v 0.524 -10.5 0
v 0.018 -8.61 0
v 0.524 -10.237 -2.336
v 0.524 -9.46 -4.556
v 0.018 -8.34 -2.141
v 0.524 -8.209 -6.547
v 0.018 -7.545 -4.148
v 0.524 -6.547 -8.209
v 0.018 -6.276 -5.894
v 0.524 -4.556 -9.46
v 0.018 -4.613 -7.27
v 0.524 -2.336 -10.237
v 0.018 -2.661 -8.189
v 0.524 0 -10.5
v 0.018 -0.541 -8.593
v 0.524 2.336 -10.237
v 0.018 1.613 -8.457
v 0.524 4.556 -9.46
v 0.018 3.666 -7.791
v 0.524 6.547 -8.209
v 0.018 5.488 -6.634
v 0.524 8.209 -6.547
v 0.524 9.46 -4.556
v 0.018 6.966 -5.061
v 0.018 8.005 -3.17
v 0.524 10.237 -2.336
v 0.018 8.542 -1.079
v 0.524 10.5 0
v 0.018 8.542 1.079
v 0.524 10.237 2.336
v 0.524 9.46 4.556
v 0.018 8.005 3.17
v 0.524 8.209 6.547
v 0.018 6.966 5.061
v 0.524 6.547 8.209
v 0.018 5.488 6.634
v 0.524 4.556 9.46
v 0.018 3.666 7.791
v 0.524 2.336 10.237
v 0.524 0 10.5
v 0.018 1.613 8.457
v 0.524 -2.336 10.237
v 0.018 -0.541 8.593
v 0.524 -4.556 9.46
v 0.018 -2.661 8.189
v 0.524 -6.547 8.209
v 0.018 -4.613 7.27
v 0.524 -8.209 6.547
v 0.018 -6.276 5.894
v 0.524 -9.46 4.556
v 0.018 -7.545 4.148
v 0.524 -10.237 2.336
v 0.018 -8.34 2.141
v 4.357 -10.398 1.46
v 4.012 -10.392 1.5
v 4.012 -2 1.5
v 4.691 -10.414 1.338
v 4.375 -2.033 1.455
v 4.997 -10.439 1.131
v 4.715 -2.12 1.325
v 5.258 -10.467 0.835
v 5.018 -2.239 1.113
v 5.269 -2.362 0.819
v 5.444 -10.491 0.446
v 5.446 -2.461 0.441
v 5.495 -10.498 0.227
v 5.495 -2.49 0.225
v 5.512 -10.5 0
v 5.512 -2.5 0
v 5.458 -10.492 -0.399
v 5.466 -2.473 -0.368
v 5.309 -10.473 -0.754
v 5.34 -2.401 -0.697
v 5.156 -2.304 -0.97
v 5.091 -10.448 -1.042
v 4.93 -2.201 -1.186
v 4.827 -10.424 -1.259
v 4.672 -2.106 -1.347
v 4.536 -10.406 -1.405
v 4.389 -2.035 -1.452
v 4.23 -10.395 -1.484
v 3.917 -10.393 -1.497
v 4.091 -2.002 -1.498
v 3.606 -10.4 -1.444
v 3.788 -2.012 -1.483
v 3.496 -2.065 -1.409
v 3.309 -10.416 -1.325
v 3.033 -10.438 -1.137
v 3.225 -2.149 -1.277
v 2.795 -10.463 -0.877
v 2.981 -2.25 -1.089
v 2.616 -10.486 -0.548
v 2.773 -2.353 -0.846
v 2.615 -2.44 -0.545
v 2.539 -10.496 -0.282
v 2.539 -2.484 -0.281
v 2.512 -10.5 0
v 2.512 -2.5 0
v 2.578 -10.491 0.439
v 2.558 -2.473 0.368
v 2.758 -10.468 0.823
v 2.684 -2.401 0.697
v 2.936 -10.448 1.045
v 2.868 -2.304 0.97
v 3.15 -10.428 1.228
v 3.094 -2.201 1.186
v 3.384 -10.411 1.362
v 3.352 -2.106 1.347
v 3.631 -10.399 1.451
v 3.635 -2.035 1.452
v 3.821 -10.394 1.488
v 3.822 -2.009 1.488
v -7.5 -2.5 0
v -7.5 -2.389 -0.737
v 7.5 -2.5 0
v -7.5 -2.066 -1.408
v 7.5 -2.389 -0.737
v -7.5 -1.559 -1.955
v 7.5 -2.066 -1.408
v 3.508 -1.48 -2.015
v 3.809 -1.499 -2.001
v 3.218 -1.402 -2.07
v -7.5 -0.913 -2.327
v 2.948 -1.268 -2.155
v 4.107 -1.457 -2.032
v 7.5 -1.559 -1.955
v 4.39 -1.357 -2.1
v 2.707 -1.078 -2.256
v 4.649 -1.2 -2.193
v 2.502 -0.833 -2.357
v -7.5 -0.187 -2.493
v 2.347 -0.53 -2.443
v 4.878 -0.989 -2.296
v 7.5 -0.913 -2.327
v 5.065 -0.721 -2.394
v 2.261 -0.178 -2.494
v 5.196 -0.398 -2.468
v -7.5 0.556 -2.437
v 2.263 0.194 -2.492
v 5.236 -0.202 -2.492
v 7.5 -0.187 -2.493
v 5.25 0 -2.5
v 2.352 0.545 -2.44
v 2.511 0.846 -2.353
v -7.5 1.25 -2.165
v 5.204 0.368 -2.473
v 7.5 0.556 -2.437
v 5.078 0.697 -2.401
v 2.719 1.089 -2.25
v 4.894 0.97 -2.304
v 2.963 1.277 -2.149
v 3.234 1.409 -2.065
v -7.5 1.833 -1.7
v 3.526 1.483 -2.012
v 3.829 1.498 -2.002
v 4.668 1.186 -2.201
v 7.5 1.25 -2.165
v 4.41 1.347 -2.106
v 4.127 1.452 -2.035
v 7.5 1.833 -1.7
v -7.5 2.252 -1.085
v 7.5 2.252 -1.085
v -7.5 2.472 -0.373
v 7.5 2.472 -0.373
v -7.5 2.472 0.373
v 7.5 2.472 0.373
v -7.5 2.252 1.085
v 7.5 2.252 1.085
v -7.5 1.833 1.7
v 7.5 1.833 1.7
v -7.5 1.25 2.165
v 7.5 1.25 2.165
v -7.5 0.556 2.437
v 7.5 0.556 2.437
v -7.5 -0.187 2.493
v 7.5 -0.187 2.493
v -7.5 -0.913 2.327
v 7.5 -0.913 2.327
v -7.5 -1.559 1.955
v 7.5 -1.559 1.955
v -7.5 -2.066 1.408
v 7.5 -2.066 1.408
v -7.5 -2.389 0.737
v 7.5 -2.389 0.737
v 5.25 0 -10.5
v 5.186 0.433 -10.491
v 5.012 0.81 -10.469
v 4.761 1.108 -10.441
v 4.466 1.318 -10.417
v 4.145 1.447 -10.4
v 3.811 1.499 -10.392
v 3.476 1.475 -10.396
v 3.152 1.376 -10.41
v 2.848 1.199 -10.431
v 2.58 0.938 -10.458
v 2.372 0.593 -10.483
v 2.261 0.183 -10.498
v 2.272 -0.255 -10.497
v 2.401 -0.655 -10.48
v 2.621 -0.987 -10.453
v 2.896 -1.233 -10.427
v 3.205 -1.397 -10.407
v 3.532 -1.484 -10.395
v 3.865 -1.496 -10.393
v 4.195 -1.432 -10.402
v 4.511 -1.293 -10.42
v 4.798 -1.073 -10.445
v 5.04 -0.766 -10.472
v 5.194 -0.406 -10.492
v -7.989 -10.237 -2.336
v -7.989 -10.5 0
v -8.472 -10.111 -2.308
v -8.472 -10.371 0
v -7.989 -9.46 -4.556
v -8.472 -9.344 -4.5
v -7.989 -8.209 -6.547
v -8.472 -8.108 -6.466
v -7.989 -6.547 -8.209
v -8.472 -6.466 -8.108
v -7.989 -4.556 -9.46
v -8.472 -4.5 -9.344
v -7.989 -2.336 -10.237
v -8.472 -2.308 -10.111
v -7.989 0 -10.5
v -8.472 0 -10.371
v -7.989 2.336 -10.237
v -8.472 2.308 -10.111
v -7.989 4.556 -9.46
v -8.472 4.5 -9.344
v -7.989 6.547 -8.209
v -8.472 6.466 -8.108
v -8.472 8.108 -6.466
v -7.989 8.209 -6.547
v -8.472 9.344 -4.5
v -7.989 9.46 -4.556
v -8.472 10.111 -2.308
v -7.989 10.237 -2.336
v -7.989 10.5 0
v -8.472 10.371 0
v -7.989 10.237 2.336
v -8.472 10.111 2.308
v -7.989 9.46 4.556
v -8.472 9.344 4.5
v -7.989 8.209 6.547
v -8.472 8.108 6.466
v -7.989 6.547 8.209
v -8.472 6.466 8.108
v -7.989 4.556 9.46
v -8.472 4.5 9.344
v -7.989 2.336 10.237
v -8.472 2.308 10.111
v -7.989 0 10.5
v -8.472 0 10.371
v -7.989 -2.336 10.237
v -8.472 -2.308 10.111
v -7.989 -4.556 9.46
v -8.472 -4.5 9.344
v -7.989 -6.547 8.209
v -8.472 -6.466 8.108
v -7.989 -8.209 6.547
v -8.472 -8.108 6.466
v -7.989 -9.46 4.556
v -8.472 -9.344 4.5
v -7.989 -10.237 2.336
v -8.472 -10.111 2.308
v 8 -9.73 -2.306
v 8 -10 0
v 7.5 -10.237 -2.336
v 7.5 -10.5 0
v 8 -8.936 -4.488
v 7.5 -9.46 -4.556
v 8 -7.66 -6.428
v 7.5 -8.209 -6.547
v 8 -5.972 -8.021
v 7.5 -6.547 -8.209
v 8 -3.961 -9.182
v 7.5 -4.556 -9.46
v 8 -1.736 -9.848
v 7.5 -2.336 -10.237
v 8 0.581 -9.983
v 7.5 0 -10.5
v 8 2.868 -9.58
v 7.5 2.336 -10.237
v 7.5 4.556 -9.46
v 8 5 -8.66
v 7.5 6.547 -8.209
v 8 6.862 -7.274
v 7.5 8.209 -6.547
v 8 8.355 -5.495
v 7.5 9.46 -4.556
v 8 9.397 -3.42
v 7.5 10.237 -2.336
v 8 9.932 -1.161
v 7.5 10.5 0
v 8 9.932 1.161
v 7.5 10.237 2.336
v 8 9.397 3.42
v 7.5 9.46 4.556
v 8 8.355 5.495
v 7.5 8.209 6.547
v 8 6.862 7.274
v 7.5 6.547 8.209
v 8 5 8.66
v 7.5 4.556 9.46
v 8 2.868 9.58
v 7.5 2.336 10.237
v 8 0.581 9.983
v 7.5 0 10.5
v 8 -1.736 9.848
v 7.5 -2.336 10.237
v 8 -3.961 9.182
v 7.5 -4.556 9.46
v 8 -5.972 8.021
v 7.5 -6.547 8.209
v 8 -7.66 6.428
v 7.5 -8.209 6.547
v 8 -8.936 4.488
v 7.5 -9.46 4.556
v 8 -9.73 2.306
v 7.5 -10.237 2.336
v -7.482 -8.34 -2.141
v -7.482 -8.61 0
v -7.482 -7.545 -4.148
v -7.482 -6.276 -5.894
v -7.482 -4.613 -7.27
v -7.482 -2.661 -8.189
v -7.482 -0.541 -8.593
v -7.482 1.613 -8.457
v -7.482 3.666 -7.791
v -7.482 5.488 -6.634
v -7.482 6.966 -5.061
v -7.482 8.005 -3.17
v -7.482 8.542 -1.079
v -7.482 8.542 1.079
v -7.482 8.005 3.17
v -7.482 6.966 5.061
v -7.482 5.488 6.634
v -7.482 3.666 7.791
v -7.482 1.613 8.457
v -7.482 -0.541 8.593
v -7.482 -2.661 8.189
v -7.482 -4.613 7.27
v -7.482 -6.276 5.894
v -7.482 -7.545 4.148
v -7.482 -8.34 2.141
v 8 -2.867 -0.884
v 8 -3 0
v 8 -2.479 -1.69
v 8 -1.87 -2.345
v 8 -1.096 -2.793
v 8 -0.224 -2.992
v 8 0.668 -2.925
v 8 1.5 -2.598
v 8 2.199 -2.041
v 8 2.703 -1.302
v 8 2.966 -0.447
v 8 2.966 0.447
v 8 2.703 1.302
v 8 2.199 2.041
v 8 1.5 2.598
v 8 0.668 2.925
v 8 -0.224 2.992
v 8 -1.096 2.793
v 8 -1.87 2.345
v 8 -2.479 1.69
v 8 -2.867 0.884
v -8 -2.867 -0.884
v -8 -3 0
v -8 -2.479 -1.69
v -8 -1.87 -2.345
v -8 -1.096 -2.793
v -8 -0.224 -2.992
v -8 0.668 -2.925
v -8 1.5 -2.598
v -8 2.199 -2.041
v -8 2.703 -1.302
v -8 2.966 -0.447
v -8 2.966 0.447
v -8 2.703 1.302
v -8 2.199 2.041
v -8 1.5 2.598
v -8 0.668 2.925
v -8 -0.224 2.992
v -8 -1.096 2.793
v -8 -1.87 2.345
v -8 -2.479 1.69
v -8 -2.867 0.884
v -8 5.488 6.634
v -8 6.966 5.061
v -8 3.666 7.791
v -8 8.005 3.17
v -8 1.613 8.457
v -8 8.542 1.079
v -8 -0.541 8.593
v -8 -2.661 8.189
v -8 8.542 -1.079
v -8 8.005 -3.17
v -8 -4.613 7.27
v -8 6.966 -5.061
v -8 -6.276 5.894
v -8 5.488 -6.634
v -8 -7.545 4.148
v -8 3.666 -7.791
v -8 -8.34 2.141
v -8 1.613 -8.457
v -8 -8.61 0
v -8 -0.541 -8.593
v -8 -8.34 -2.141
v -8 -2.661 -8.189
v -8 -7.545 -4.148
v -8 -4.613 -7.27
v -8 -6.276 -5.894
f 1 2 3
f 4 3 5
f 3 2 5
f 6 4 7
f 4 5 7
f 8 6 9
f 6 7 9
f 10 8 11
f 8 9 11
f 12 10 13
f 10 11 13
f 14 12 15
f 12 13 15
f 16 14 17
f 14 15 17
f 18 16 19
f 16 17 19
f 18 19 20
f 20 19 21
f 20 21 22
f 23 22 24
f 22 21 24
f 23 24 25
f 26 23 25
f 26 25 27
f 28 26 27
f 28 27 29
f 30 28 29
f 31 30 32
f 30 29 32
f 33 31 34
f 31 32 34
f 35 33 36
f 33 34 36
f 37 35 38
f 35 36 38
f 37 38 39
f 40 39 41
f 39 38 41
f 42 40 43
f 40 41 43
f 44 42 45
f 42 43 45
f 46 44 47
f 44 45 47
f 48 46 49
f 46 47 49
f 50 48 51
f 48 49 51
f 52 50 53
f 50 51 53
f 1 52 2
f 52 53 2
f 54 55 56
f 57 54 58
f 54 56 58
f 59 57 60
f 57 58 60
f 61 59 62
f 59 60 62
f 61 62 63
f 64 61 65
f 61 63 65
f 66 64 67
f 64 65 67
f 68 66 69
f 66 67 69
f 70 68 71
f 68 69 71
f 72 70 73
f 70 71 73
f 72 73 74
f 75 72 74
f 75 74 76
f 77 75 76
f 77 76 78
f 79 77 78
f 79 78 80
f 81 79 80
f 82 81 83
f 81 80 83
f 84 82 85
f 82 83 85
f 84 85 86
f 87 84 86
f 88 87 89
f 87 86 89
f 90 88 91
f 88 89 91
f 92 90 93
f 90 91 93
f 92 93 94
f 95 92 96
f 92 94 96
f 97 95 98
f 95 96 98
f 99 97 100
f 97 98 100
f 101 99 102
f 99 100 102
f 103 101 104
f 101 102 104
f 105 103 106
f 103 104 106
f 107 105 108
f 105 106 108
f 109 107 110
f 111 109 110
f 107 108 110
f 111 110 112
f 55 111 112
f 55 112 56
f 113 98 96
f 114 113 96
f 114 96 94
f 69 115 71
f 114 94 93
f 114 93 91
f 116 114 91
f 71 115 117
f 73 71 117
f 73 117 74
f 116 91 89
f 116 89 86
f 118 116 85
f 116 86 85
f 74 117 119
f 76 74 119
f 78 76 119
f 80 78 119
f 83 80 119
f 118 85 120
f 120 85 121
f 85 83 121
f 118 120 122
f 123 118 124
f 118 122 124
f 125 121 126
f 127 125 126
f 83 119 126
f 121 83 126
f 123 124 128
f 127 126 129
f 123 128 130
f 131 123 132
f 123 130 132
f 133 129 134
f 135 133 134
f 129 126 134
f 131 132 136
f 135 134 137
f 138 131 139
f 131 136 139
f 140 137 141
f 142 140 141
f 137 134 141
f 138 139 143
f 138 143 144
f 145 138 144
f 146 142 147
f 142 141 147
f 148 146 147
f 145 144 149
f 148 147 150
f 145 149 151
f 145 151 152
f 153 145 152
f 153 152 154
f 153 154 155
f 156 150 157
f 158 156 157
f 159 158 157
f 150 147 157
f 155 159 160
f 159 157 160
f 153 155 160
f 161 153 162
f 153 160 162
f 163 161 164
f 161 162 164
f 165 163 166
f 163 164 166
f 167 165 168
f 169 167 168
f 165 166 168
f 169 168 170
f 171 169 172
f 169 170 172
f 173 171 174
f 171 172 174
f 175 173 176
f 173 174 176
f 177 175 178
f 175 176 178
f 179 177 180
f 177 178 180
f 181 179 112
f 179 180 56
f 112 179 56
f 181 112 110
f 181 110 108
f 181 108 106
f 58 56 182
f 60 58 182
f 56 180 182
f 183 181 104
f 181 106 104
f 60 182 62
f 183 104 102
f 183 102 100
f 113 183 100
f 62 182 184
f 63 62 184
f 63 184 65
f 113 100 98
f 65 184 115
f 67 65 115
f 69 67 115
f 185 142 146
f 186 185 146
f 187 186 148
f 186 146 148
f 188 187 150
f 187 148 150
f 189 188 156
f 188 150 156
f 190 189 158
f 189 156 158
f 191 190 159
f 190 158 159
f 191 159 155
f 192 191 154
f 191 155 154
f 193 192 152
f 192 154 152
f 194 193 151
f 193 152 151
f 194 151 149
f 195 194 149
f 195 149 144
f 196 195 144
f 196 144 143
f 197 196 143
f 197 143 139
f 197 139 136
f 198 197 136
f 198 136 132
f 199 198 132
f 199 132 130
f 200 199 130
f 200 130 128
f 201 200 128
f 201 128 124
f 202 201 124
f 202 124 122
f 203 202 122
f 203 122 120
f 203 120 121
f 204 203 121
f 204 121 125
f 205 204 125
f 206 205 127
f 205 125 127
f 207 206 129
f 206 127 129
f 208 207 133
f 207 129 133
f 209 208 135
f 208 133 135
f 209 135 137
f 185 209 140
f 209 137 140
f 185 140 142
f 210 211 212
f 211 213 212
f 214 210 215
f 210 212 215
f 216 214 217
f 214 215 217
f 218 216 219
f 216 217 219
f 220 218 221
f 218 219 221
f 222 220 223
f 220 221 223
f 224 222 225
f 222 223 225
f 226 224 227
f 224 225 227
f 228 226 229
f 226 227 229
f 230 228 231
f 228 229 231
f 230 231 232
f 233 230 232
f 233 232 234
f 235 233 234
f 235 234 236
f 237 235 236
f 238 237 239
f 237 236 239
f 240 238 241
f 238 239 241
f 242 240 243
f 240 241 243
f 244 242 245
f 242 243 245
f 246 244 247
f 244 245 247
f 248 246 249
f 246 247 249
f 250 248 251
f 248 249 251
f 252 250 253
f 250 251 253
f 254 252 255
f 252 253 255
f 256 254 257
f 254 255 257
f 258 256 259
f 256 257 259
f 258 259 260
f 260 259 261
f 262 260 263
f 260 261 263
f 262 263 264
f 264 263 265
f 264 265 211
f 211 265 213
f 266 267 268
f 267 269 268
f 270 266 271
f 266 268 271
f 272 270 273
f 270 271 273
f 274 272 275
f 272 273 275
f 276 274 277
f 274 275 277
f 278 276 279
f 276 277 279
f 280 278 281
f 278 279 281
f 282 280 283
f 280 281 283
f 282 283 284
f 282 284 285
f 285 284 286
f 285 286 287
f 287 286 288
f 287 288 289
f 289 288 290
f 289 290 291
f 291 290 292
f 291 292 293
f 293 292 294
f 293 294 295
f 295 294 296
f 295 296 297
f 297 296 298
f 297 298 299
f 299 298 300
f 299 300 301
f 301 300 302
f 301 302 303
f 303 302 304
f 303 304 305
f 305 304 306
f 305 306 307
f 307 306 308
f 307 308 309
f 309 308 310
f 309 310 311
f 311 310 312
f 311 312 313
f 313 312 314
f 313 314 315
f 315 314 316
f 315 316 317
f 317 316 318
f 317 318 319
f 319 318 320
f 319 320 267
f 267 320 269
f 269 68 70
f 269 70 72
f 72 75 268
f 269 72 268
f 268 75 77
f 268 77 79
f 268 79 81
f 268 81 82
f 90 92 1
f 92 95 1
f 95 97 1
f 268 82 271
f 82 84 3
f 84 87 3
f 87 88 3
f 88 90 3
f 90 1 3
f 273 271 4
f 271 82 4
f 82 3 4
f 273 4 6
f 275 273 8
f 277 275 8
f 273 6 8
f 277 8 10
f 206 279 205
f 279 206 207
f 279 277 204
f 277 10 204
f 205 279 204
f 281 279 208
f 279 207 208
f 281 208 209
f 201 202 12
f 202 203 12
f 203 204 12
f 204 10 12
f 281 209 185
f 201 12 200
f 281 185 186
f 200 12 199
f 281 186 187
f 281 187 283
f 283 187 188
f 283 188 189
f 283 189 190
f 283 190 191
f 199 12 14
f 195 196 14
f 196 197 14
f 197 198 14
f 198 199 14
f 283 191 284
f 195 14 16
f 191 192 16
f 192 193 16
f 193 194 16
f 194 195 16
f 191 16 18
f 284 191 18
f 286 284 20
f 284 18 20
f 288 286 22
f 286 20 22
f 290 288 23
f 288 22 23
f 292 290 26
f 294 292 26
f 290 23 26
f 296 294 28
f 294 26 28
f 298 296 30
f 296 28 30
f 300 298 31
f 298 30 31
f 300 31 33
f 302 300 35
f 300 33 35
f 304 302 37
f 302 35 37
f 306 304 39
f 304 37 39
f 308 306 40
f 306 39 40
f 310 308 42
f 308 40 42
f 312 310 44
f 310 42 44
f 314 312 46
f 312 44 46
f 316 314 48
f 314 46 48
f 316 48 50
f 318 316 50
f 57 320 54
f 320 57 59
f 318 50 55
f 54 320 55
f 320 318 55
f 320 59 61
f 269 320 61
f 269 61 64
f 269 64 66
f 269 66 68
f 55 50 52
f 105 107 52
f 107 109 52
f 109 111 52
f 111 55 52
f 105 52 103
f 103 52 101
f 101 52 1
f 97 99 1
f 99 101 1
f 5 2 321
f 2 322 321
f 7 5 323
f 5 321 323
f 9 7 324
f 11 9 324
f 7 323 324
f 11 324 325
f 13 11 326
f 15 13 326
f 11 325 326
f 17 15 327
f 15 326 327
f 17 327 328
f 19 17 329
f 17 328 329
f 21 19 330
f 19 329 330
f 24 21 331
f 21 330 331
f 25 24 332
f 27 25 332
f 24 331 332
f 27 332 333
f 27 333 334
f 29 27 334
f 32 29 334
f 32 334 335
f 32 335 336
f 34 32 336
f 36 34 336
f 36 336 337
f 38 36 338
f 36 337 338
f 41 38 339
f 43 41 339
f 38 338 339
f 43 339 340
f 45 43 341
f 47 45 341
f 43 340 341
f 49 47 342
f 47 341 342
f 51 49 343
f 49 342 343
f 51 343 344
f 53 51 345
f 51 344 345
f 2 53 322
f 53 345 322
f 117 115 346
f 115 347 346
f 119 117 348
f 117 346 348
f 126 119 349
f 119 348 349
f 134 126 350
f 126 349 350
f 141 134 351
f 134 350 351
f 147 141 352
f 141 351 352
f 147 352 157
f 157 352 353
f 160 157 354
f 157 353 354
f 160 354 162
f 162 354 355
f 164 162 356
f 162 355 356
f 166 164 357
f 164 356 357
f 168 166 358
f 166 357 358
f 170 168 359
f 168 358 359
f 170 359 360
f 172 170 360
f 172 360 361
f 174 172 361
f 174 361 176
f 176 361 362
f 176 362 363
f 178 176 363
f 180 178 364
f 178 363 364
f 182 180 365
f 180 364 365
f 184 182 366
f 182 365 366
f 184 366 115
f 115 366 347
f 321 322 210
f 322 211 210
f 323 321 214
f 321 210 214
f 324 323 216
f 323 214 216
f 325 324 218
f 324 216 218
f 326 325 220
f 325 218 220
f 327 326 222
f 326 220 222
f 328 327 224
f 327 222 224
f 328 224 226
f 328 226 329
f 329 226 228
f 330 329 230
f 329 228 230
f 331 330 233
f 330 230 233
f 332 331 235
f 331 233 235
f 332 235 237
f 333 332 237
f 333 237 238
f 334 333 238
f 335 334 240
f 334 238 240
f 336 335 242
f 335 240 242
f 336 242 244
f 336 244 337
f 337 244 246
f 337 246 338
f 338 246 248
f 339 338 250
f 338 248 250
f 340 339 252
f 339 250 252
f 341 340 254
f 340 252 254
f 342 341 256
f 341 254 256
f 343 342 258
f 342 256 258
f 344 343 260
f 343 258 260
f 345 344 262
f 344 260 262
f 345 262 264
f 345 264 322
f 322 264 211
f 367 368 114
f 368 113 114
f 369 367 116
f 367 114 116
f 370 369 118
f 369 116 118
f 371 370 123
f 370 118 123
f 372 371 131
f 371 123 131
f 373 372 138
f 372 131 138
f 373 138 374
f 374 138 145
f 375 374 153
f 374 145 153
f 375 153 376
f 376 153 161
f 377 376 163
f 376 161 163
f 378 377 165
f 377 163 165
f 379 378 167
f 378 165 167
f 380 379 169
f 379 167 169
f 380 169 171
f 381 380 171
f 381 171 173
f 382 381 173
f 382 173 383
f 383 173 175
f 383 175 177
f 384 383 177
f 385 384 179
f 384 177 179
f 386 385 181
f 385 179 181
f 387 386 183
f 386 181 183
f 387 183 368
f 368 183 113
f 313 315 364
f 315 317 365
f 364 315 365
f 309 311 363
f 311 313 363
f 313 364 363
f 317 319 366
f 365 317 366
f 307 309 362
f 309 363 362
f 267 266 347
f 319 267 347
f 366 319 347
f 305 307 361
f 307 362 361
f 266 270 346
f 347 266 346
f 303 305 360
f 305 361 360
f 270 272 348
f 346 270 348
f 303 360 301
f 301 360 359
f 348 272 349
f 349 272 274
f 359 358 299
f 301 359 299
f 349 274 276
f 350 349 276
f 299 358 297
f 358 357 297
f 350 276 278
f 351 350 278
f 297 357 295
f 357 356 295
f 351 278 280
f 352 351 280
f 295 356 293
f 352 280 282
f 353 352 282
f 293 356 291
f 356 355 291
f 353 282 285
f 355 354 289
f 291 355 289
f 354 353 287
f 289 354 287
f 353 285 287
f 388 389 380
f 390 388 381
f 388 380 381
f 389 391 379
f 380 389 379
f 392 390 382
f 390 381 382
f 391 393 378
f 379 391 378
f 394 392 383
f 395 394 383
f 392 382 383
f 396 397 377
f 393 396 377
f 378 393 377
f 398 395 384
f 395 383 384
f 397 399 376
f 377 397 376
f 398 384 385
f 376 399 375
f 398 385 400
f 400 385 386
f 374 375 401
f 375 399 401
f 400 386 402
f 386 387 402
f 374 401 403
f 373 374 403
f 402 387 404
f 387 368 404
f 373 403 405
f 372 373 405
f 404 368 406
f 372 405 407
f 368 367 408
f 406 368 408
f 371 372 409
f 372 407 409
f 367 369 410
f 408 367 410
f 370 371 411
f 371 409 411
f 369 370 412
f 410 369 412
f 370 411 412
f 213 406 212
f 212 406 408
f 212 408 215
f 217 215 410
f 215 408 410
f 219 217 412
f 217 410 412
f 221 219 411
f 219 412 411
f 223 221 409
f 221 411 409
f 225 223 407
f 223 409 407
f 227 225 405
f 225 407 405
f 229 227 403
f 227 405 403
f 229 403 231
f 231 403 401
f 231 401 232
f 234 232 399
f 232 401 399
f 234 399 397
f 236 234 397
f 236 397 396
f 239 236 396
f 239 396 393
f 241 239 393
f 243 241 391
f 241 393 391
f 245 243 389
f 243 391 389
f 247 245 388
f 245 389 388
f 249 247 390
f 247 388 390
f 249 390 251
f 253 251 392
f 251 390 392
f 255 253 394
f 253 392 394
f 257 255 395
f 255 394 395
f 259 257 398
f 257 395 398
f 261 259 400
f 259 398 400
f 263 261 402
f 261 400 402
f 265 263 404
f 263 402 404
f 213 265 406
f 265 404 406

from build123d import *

# Parameters (mm, degrees)
TAGLIO_ESTRUSIONE1_REACH      = 19.096
TAGLIO_ESTRUSIONE1_END_RADIUS = 10.5
SCHIZZO2_R                    = 1.5
TAGLIO_ESTRUSIONE2_REACH      = 19.096
TAGLIO_ESTRUSIONE2_END_RADIUS = 10.5
SCHIZZO3_R                    = 1.5


with BuildPart() as part:
    # Schizzo1 → Rivoluzione1 (revolve)
    with BuildSketch(Plane.XY, mode=Mode.PRIVATE) as rivoluzione1_sk:
        Polygon((-8, 3), (-7.5, 2.5), (7.5, 2.5), (8, 3), (8, 10), (7.5, 10.5), (0.524062064, 10.5), (0.01763809, 8.61), (-7.48236191, 8.61), (-7.988785883, 10.5), (-8.471748797, 10.370590477), (-8, 8.61), align=None)
    revolve(rivoluzione1_sk.sketch.rotate(Axis((-8, 0, 0), (1, 0, 0)), 180), axis=Axis((-8, 0, 0), (1, 0, 0)))

    # Taglio-Estrusione1: up to this cylinder (the profile starts inside it)
    taglio_estrusione1_end = Plane(origin=(3.75, 0, 0), z_dir=(-1, 0, 0)) * Cylinder(TAGLIO_ESTRUSIONE1_END_RADIUS, 60.192, mode=Mode.PRIVATE)
    # Schizzo2 → Taglio-Estrusione1 (cut, up to the surface)
    with BuildSketch(Plane.XY, mode=Mode.PRIVATE) as taglio_estrusione1_sk1:
        with Locations((3.75, 0)):
            Circle(SCHIZZO2_R)
    taglio_estrusione1_tool1 = extrude(taglio_estrusione1_sk1.sketch, amount=-TAGLIO_ESTRUSIONE1_REACH, mode=Mode.PRIVATE) & taglio_estrusione1_end
    add(taglio_estrusione1_tool1.solids().sort_by_distance((3.75, 0, 0))[0], mode=Mode.SUBTRACT)

    # Taglio-Estrusione2: up to this cylinder (the profile starts inside it)
    taglio_estrusione2_end = Plane(origin=(4.012031, 0, 0), z_dir=(-1, 0, 0)) * Cylinder(TAGLIO_ESTRUSIONE2_END_RADIUS, 60.192, mode=Mode.PRIVATE)
    # Schizzo3 → Taglio-Estrusione2 (cut, up to the surface)
    with BuildSketch(Plane(origin=(0, 0, 0), x_dir=(1, 0, 0), z_dir=(0, 1, 0)), mode=Mode.PRIVATE) as taglio_estrusione2_sk1:
        with Locations(Location((4.012031032, 0, 0), (0, 0, 270))):
            Circle(SCHIZZO3_R)
    taglio_estrusione2_tool1 = extrude(taglio_estrusione2_sk1.sketch, amount=-TAGLIO_ESTRUSIONE2_REACH, mode=Mode.PRIVATE) & taglio_estrusione2_end
    add(taglio_estrusione2_tool1.solids().sort_by_distance((4.012031, 0, 0))[0], mode=Mode.SUBTRACT)


solid = part.part
